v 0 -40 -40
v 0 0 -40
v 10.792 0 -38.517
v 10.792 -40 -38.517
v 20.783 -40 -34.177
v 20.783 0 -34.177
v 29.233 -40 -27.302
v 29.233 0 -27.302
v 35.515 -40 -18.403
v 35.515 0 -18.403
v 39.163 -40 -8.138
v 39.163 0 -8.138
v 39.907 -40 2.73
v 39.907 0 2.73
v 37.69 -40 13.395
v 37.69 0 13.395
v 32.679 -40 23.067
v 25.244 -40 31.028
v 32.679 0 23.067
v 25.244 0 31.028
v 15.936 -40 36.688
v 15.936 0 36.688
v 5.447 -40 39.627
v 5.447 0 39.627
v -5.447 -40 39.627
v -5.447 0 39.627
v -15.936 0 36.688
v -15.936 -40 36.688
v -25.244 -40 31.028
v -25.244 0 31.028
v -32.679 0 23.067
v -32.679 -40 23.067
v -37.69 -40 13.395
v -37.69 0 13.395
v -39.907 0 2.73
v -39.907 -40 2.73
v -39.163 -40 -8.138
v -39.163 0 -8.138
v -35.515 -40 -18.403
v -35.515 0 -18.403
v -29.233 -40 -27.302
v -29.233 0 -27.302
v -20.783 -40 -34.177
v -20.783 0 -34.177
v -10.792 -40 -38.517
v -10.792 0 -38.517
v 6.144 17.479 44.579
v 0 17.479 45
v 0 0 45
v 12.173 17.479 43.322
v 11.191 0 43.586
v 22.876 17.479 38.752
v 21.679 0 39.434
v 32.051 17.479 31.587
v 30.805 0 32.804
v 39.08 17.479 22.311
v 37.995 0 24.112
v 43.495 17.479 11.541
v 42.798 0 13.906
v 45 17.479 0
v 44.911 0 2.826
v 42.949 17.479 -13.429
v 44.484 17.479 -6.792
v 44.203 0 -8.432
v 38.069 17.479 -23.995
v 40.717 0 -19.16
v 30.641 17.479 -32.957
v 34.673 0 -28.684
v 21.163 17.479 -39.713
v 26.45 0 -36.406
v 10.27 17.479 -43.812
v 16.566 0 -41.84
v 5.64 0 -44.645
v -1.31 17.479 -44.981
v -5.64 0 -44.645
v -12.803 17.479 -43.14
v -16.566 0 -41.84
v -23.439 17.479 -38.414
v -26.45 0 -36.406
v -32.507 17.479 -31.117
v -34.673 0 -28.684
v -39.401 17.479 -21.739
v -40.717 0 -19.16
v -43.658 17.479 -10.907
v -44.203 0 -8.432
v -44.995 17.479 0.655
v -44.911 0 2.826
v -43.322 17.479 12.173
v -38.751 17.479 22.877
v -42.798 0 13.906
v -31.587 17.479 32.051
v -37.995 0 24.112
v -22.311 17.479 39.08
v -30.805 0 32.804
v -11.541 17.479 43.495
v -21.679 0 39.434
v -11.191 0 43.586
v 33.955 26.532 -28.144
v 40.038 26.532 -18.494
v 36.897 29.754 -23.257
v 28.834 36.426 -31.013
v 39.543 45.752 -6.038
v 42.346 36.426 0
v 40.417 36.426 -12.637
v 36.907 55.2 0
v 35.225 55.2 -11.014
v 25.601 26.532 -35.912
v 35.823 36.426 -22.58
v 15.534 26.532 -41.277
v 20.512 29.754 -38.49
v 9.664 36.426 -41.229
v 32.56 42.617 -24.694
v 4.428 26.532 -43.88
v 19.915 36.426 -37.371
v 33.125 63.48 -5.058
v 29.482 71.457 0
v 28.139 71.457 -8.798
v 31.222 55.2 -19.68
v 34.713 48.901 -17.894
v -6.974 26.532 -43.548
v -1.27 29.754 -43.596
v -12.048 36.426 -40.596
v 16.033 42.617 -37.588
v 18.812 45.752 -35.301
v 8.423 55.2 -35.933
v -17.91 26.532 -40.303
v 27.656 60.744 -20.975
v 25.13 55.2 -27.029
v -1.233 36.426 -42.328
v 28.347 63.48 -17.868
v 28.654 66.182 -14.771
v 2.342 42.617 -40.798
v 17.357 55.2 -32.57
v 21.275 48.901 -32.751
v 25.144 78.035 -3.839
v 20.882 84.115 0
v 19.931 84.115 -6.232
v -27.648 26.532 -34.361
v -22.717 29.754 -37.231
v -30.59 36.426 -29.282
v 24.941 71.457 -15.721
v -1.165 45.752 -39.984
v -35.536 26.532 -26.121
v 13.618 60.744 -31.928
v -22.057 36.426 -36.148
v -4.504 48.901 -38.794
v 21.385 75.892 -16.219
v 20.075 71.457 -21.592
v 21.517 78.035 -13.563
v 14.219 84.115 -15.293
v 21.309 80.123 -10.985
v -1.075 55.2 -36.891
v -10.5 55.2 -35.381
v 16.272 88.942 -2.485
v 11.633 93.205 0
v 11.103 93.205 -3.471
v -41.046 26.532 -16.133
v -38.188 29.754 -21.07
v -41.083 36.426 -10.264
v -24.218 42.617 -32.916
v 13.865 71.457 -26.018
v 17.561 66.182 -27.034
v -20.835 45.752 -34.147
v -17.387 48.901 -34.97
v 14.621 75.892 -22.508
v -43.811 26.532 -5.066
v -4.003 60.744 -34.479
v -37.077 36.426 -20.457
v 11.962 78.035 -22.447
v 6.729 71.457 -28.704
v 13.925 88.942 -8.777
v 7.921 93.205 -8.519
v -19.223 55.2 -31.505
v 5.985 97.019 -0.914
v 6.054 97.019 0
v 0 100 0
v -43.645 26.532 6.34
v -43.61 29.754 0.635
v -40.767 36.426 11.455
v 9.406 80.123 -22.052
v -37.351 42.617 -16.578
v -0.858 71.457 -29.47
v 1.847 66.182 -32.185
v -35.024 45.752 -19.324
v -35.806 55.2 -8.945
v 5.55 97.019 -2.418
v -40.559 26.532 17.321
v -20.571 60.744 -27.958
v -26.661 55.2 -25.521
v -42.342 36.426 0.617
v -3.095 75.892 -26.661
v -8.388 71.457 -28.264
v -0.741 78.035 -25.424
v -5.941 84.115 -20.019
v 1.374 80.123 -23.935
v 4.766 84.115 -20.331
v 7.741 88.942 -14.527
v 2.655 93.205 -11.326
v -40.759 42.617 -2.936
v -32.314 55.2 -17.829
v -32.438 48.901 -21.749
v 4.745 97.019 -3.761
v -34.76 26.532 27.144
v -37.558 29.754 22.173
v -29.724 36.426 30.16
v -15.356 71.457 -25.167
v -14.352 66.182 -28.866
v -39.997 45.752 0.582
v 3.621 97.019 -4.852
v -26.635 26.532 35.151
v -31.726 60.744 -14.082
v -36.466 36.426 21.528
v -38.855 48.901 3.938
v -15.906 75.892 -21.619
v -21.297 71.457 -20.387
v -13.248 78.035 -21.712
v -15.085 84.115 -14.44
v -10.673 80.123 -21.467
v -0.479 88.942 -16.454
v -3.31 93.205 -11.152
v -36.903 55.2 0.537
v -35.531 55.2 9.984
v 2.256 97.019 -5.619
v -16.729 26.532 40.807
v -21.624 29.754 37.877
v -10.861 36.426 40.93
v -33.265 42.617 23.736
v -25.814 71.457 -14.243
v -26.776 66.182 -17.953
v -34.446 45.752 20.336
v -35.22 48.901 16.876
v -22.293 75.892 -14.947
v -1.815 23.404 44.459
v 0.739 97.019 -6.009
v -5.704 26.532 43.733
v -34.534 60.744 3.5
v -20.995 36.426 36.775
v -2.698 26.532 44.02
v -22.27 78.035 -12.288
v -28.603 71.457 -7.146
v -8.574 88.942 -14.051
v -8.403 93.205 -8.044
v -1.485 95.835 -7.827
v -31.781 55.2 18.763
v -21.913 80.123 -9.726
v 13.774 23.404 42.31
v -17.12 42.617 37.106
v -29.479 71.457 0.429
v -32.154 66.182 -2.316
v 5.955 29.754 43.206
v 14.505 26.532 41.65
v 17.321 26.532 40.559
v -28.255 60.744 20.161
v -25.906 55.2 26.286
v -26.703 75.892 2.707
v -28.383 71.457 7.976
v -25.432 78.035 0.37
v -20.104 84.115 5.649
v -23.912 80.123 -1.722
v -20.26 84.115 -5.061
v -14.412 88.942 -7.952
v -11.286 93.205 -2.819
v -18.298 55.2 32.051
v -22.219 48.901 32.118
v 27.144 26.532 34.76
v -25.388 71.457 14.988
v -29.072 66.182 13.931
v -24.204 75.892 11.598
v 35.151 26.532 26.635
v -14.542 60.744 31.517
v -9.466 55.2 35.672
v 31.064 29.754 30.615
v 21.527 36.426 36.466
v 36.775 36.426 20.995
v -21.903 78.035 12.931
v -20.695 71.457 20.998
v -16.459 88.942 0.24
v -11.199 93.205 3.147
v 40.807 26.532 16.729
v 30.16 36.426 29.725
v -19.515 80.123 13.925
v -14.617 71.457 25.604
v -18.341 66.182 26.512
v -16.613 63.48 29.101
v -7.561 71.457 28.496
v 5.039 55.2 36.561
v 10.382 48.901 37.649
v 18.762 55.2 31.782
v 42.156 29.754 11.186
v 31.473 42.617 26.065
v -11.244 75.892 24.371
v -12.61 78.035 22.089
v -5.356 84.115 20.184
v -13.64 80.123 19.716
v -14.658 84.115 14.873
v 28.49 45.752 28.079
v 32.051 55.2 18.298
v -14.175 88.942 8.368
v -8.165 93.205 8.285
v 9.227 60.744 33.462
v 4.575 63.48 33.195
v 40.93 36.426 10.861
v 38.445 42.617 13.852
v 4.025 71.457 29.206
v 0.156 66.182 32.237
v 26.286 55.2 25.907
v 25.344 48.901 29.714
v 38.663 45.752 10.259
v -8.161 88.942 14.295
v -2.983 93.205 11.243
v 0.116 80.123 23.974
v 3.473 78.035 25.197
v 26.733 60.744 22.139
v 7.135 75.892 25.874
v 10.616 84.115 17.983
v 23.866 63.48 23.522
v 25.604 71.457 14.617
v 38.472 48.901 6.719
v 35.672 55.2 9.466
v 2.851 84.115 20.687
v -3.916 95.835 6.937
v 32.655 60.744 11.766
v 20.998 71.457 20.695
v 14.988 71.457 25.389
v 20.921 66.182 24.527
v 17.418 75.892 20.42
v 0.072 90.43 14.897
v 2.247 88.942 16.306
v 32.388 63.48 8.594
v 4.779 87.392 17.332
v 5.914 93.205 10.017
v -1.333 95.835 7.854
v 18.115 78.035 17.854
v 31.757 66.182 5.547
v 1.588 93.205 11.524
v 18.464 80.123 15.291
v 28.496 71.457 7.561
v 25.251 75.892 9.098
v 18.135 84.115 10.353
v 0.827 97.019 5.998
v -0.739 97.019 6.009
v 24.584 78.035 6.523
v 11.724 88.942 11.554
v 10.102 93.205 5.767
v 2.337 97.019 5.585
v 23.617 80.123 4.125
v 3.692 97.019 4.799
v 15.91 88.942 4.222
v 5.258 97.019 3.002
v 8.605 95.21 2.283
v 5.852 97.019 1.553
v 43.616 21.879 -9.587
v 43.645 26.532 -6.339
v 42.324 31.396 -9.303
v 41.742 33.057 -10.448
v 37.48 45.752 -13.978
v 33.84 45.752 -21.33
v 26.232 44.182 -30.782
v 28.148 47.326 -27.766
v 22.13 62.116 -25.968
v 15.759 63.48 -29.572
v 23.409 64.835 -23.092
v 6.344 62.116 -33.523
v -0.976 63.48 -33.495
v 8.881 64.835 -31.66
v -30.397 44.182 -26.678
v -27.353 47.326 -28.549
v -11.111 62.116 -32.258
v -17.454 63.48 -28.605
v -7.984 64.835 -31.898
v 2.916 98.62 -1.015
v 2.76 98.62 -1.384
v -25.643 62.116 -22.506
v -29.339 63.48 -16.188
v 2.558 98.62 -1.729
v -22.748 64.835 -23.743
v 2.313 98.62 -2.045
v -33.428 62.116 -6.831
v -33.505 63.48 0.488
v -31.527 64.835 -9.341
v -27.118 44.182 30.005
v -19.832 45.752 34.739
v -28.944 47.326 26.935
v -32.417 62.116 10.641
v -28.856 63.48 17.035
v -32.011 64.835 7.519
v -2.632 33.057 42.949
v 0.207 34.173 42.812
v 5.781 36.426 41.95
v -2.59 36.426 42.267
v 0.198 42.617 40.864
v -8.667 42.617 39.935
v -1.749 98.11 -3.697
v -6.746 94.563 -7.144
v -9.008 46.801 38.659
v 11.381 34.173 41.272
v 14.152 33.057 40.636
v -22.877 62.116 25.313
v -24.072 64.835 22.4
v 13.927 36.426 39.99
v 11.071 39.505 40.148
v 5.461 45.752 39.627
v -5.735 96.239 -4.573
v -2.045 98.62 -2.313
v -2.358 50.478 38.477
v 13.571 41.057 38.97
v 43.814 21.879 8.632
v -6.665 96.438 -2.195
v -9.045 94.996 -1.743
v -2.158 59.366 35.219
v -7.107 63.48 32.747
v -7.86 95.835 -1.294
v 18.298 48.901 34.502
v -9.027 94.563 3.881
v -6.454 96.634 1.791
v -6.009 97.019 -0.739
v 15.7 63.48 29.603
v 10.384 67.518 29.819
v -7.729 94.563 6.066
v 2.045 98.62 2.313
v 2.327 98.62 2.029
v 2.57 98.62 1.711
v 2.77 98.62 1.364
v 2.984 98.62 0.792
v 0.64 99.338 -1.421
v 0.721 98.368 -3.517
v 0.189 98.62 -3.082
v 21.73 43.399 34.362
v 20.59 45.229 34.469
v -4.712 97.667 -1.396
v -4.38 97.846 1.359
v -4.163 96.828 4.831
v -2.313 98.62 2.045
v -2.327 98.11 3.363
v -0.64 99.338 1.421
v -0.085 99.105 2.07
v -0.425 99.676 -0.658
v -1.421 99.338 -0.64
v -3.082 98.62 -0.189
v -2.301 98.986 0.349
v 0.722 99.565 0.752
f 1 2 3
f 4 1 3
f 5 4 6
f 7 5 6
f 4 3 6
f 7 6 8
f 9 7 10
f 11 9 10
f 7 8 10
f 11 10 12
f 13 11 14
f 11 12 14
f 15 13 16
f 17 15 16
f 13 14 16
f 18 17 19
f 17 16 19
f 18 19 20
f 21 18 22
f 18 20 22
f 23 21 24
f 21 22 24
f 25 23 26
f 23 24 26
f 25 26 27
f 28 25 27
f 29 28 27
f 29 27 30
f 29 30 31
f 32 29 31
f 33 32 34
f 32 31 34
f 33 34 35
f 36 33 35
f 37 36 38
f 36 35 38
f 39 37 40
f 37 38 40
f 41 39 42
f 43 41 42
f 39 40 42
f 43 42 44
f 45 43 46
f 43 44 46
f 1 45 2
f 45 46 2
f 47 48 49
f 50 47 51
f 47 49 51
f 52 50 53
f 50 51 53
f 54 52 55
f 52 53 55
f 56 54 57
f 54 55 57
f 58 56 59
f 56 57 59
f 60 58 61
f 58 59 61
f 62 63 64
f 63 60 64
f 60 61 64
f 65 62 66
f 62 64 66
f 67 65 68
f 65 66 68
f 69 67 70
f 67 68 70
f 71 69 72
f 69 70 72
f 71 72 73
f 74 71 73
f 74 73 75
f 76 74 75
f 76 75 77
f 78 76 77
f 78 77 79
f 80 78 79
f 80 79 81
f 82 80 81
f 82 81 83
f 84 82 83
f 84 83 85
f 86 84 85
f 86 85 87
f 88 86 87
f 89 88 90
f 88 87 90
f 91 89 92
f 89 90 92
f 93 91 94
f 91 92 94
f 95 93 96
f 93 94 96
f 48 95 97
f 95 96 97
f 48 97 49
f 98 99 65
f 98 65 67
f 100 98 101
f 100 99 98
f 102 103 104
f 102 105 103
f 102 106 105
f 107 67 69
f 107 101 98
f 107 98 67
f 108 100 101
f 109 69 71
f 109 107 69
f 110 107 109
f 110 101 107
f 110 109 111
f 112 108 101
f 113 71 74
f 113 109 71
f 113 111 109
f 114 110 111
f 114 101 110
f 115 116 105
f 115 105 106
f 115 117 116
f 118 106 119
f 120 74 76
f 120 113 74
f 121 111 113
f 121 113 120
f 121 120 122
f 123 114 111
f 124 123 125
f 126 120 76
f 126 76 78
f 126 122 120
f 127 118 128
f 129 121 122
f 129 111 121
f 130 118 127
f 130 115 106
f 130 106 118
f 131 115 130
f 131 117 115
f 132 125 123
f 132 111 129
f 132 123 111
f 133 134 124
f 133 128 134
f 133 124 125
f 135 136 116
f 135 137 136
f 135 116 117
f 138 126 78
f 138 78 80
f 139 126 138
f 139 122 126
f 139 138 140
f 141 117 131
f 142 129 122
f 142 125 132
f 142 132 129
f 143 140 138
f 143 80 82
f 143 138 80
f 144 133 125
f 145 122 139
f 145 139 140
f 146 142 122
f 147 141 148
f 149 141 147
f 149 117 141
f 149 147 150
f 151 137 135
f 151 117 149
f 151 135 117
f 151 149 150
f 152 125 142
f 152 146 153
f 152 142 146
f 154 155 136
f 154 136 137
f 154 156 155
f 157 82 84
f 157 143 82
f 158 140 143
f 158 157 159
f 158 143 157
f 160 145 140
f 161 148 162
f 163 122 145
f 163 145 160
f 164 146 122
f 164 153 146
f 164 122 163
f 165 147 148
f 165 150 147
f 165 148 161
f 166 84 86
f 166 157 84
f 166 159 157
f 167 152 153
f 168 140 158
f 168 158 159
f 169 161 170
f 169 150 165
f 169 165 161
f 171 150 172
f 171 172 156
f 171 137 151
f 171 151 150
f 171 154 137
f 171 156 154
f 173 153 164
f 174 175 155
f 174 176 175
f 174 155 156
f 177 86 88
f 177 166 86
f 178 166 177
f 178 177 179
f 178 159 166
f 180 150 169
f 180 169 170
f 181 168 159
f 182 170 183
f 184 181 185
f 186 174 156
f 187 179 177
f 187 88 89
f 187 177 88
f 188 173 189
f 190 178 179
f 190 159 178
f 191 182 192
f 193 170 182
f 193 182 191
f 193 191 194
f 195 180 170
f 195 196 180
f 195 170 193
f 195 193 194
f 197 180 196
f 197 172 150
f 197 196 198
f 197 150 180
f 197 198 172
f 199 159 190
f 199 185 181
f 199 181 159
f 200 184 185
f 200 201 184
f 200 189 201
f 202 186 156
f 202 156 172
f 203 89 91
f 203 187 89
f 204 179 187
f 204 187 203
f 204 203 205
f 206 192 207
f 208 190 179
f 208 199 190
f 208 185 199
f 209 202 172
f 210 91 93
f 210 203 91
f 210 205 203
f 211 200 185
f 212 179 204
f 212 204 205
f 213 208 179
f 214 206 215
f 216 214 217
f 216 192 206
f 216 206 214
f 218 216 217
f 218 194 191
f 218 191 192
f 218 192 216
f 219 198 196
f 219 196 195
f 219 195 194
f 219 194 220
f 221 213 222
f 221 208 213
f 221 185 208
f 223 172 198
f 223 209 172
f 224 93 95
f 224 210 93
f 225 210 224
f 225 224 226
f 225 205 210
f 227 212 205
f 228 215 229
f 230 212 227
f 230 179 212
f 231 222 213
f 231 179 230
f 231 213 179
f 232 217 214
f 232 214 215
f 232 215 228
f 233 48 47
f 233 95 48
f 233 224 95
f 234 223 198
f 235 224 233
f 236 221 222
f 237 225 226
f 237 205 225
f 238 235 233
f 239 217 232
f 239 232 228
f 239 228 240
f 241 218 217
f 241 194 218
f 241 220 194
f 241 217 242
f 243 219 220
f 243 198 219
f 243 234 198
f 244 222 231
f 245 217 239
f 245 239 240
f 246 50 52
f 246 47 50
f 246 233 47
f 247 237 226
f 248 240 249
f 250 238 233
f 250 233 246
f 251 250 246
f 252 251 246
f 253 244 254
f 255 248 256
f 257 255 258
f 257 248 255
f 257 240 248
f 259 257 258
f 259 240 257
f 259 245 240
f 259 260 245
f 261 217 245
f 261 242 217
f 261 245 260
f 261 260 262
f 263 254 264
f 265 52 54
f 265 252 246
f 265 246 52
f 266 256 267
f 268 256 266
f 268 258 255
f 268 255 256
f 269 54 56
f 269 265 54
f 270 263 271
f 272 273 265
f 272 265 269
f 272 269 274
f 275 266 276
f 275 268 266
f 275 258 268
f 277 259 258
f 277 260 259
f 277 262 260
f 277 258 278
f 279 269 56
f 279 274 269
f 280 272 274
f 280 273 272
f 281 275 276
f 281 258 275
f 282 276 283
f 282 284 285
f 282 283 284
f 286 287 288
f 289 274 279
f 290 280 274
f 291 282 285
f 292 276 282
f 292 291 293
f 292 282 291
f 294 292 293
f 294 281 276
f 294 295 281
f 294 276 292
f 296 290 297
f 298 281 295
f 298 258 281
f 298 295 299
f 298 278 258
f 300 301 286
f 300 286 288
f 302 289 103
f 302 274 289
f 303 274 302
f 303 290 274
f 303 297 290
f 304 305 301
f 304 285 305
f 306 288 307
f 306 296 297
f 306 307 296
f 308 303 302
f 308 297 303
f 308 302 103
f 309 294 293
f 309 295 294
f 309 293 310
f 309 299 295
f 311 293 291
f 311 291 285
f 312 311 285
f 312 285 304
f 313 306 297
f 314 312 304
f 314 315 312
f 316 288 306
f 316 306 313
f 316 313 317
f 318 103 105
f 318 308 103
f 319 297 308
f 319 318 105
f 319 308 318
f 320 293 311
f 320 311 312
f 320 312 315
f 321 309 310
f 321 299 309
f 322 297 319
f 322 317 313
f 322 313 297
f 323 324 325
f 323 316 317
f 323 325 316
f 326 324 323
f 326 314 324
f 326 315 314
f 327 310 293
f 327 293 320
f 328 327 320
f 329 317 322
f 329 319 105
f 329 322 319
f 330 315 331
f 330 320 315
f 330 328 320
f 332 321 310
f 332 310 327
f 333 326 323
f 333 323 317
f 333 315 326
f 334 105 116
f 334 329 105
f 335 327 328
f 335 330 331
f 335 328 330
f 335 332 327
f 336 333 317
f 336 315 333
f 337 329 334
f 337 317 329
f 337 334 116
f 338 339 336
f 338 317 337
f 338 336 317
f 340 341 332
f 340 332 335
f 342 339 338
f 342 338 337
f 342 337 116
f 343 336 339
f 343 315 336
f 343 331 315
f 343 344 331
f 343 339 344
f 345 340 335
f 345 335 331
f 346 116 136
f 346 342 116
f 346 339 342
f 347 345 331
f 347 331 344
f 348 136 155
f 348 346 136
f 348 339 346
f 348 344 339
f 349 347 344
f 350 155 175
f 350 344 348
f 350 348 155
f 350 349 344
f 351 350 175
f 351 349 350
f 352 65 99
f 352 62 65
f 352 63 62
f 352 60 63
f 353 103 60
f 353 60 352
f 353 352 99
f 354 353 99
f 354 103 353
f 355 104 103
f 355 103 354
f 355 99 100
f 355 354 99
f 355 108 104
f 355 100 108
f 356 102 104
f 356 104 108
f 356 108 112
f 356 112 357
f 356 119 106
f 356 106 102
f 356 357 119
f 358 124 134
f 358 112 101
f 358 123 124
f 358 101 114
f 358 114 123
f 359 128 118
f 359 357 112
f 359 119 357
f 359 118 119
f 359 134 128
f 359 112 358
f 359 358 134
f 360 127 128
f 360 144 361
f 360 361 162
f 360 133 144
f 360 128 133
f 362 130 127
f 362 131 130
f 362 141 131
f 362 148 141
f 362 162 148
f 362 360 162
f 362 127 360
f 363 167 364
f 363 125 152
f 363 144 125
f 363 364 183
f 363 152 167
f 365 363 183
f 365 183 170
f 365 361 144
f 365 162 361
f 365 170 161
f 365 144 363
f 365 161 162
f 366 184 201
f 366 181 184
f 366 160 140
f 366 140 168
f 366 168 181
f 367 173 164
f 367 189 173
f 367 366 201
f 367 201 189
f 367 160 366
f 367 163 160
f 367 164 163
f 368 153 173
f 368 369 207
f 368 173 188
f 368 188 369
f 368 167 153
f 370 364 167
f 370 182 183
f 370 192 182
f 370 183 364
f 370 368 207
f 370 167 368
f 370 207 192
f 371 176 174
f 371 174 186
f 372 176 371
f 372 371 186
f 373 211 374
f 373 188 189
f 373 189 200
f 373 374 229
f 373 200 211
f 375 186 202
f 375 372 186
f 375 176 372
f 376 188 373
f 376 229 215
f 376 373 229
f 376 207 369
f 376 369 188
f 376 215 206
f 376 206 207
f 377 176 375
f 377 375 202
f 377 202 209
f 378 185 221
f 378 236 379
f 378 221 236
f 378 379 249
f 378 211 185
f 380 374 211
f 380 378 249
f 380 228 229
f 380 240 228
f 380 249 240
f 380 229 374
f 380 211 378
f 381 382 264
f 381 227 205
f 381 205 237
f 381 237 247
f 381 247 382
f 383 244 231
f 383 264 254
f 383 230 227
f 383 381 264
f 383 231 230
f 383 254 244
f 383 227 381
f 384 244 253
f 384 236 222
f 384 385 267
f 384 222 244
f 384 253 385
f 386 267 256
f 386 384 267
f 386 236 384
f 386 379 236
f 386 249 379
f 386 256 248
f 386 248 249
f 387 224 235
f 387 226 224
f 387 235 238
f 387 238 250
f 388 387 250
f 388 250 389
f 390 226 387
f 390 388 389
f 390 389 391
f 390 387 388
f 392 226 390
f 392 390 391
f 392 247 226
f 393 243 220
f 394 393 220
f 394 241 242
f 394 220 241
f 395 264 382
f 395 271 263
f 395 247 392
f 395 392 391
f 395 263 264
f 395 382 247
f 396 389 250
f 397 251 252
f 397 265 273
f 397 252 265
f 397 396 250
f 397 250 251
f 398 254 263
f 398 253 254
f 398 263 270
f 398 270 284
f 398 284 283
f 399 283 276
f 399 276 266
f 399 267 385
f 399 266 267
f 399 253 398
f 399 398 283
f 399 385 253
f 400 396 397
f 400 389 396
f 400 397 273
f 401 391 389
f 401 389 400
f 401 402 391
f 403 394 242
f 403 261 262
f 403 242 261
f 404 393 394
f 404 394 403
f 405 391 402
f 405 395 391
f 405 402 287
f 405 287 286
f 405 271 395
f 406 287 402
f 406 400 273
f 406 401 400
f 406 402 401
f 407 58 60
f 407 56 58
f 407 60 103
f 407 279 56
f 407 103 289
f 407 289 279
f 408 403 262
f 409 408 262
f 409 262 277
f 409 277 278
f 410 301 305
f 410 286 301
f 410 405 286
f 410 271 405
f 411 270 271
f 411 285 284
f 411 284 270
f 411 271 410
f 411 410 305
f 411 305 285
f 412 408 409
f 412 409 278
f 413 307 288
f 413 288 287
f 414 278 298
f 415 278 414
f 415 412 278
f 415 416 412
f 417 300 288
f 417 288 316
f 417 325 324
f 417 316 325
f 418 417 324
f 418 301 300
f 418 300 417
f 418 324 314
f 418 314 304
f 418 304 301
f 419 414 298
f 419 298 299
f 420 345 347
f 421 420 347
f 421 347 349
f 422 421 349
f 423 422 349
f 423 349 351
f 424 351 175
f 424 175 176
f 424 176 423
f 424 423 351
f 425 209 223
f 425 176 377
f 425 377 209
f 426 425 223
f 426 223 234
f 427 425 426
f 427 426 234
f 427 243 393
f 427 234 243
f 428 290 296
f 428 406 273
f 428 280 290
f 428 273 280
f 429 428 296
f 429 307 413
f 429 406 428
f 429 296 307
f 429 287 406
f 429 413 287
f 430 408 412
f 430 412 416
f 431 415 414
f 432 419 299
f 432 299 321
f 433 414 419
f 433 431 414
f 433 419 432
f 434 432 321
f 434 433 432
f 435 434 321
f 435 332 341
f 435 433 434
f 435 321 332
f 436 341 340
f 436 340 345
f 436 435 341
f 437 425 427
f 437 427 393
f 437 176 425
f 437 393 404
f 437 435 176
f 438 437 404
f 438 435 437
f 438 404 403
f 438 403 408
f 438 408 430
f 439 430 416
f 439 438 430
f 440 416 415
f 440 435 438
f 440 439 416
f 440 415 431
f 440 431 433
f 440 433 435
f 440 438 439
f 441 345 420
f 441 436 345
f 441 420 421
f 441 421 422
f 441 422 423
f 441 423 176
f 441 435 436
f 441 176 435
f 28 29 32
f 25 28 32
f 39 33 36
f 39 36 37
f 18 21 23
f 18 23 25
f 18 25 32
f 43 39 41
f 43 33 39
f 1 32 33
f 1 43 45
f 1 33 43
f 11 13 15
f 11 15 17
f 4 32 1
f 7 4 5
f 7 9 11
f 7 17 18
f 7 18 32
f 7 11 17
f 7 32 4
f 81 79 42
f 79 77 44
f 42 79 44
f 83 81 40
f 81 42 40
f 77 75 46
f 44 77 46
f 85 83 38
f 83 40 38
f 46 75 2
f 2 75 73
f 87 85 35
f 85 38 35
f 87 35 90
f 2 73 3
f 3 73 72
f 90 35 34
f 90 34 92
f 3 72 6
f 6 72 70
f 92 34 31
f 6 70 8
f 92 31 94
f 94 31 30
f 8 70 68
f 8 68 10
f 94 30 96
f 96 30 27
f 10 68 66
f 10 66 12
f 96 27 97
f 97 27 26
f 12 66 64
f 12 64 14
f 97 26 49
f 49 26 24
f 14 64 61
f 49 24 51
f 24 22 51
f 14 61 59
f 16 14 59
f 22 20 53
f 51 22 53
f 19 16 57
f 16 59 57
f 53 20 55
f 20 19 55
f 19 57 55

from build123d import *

# Parameters (mm, degrees)
SKETCH6_R           = 45
BOSS_EXTRUDE7_DEPTH = 100
SKETCH8_R           = 40
BOSS_EXTRUDE8_DEPTH = 40


with BuildPart() as part:
    # Sketch6 → Boss-Extrude7 (new body)
    with BuildSketch(Plane(origin=(0, 0, 0), x_dir=(1, 0, 0), z_dir=(0, 1, 0))):
        with Locations(Location((0, 0, 0), (0, 0, 270))):
            Circle(SKETCH6_R)
    extrude(amount=BOSS_EXTRUDE7_DEPTH)


with BuildPart() as body_2:
    # Sketch7 → Revolve2 (revolve)
    with BuildSketch(Plane.XY, mode=Mode.PRIVATE) as revolve2_sk:
        with BuildLine():
            Line((0, 100), (0, 125.083403494))
            Line((0, 125.083403494), (-88.216224583, 125.083403494))
            Line((-88.216224583, 125.083403494), (-88.216224583, 0))
            Line((-88.216224583, 0), (-45, 0))
            add(Edge.make_bspline(
                [(-45, 0), (-45.199870538, 9.069967987), (-45.686940304, 37.078388642), (-29.510811545, 88.131965608), (0, 100)],
                knots=[0, 0, 0, 0, 0.165319882, 1, 1, 1, 1], degree=3))
        make_face()
    revolve(revolve2_sk.sketch.rotate(Axis((0, 100, 0), (0, 1, 0)), 180), axis=Axis((0, 100, 0), (0, 1, 0)))


with BuildPart() as part_1:
    add(part.part)

    # Intersect1: read off the stored shape, not the designer's step
    # Intersect1: cut body 2
    add(body_2.part, mode=Mode.SUBTRACT)

    # Sketch8 → Boss-Extrude8 (add)
    with BuildSketch(Plane.XZ):
        with Locations(Location((0, 0, 0), (0, 0, 270))):
            Circle(SKETCH8_R)
    extrude(amount=BOSS_EXTRUDE8_DEPTH)


solid = part_1.part
